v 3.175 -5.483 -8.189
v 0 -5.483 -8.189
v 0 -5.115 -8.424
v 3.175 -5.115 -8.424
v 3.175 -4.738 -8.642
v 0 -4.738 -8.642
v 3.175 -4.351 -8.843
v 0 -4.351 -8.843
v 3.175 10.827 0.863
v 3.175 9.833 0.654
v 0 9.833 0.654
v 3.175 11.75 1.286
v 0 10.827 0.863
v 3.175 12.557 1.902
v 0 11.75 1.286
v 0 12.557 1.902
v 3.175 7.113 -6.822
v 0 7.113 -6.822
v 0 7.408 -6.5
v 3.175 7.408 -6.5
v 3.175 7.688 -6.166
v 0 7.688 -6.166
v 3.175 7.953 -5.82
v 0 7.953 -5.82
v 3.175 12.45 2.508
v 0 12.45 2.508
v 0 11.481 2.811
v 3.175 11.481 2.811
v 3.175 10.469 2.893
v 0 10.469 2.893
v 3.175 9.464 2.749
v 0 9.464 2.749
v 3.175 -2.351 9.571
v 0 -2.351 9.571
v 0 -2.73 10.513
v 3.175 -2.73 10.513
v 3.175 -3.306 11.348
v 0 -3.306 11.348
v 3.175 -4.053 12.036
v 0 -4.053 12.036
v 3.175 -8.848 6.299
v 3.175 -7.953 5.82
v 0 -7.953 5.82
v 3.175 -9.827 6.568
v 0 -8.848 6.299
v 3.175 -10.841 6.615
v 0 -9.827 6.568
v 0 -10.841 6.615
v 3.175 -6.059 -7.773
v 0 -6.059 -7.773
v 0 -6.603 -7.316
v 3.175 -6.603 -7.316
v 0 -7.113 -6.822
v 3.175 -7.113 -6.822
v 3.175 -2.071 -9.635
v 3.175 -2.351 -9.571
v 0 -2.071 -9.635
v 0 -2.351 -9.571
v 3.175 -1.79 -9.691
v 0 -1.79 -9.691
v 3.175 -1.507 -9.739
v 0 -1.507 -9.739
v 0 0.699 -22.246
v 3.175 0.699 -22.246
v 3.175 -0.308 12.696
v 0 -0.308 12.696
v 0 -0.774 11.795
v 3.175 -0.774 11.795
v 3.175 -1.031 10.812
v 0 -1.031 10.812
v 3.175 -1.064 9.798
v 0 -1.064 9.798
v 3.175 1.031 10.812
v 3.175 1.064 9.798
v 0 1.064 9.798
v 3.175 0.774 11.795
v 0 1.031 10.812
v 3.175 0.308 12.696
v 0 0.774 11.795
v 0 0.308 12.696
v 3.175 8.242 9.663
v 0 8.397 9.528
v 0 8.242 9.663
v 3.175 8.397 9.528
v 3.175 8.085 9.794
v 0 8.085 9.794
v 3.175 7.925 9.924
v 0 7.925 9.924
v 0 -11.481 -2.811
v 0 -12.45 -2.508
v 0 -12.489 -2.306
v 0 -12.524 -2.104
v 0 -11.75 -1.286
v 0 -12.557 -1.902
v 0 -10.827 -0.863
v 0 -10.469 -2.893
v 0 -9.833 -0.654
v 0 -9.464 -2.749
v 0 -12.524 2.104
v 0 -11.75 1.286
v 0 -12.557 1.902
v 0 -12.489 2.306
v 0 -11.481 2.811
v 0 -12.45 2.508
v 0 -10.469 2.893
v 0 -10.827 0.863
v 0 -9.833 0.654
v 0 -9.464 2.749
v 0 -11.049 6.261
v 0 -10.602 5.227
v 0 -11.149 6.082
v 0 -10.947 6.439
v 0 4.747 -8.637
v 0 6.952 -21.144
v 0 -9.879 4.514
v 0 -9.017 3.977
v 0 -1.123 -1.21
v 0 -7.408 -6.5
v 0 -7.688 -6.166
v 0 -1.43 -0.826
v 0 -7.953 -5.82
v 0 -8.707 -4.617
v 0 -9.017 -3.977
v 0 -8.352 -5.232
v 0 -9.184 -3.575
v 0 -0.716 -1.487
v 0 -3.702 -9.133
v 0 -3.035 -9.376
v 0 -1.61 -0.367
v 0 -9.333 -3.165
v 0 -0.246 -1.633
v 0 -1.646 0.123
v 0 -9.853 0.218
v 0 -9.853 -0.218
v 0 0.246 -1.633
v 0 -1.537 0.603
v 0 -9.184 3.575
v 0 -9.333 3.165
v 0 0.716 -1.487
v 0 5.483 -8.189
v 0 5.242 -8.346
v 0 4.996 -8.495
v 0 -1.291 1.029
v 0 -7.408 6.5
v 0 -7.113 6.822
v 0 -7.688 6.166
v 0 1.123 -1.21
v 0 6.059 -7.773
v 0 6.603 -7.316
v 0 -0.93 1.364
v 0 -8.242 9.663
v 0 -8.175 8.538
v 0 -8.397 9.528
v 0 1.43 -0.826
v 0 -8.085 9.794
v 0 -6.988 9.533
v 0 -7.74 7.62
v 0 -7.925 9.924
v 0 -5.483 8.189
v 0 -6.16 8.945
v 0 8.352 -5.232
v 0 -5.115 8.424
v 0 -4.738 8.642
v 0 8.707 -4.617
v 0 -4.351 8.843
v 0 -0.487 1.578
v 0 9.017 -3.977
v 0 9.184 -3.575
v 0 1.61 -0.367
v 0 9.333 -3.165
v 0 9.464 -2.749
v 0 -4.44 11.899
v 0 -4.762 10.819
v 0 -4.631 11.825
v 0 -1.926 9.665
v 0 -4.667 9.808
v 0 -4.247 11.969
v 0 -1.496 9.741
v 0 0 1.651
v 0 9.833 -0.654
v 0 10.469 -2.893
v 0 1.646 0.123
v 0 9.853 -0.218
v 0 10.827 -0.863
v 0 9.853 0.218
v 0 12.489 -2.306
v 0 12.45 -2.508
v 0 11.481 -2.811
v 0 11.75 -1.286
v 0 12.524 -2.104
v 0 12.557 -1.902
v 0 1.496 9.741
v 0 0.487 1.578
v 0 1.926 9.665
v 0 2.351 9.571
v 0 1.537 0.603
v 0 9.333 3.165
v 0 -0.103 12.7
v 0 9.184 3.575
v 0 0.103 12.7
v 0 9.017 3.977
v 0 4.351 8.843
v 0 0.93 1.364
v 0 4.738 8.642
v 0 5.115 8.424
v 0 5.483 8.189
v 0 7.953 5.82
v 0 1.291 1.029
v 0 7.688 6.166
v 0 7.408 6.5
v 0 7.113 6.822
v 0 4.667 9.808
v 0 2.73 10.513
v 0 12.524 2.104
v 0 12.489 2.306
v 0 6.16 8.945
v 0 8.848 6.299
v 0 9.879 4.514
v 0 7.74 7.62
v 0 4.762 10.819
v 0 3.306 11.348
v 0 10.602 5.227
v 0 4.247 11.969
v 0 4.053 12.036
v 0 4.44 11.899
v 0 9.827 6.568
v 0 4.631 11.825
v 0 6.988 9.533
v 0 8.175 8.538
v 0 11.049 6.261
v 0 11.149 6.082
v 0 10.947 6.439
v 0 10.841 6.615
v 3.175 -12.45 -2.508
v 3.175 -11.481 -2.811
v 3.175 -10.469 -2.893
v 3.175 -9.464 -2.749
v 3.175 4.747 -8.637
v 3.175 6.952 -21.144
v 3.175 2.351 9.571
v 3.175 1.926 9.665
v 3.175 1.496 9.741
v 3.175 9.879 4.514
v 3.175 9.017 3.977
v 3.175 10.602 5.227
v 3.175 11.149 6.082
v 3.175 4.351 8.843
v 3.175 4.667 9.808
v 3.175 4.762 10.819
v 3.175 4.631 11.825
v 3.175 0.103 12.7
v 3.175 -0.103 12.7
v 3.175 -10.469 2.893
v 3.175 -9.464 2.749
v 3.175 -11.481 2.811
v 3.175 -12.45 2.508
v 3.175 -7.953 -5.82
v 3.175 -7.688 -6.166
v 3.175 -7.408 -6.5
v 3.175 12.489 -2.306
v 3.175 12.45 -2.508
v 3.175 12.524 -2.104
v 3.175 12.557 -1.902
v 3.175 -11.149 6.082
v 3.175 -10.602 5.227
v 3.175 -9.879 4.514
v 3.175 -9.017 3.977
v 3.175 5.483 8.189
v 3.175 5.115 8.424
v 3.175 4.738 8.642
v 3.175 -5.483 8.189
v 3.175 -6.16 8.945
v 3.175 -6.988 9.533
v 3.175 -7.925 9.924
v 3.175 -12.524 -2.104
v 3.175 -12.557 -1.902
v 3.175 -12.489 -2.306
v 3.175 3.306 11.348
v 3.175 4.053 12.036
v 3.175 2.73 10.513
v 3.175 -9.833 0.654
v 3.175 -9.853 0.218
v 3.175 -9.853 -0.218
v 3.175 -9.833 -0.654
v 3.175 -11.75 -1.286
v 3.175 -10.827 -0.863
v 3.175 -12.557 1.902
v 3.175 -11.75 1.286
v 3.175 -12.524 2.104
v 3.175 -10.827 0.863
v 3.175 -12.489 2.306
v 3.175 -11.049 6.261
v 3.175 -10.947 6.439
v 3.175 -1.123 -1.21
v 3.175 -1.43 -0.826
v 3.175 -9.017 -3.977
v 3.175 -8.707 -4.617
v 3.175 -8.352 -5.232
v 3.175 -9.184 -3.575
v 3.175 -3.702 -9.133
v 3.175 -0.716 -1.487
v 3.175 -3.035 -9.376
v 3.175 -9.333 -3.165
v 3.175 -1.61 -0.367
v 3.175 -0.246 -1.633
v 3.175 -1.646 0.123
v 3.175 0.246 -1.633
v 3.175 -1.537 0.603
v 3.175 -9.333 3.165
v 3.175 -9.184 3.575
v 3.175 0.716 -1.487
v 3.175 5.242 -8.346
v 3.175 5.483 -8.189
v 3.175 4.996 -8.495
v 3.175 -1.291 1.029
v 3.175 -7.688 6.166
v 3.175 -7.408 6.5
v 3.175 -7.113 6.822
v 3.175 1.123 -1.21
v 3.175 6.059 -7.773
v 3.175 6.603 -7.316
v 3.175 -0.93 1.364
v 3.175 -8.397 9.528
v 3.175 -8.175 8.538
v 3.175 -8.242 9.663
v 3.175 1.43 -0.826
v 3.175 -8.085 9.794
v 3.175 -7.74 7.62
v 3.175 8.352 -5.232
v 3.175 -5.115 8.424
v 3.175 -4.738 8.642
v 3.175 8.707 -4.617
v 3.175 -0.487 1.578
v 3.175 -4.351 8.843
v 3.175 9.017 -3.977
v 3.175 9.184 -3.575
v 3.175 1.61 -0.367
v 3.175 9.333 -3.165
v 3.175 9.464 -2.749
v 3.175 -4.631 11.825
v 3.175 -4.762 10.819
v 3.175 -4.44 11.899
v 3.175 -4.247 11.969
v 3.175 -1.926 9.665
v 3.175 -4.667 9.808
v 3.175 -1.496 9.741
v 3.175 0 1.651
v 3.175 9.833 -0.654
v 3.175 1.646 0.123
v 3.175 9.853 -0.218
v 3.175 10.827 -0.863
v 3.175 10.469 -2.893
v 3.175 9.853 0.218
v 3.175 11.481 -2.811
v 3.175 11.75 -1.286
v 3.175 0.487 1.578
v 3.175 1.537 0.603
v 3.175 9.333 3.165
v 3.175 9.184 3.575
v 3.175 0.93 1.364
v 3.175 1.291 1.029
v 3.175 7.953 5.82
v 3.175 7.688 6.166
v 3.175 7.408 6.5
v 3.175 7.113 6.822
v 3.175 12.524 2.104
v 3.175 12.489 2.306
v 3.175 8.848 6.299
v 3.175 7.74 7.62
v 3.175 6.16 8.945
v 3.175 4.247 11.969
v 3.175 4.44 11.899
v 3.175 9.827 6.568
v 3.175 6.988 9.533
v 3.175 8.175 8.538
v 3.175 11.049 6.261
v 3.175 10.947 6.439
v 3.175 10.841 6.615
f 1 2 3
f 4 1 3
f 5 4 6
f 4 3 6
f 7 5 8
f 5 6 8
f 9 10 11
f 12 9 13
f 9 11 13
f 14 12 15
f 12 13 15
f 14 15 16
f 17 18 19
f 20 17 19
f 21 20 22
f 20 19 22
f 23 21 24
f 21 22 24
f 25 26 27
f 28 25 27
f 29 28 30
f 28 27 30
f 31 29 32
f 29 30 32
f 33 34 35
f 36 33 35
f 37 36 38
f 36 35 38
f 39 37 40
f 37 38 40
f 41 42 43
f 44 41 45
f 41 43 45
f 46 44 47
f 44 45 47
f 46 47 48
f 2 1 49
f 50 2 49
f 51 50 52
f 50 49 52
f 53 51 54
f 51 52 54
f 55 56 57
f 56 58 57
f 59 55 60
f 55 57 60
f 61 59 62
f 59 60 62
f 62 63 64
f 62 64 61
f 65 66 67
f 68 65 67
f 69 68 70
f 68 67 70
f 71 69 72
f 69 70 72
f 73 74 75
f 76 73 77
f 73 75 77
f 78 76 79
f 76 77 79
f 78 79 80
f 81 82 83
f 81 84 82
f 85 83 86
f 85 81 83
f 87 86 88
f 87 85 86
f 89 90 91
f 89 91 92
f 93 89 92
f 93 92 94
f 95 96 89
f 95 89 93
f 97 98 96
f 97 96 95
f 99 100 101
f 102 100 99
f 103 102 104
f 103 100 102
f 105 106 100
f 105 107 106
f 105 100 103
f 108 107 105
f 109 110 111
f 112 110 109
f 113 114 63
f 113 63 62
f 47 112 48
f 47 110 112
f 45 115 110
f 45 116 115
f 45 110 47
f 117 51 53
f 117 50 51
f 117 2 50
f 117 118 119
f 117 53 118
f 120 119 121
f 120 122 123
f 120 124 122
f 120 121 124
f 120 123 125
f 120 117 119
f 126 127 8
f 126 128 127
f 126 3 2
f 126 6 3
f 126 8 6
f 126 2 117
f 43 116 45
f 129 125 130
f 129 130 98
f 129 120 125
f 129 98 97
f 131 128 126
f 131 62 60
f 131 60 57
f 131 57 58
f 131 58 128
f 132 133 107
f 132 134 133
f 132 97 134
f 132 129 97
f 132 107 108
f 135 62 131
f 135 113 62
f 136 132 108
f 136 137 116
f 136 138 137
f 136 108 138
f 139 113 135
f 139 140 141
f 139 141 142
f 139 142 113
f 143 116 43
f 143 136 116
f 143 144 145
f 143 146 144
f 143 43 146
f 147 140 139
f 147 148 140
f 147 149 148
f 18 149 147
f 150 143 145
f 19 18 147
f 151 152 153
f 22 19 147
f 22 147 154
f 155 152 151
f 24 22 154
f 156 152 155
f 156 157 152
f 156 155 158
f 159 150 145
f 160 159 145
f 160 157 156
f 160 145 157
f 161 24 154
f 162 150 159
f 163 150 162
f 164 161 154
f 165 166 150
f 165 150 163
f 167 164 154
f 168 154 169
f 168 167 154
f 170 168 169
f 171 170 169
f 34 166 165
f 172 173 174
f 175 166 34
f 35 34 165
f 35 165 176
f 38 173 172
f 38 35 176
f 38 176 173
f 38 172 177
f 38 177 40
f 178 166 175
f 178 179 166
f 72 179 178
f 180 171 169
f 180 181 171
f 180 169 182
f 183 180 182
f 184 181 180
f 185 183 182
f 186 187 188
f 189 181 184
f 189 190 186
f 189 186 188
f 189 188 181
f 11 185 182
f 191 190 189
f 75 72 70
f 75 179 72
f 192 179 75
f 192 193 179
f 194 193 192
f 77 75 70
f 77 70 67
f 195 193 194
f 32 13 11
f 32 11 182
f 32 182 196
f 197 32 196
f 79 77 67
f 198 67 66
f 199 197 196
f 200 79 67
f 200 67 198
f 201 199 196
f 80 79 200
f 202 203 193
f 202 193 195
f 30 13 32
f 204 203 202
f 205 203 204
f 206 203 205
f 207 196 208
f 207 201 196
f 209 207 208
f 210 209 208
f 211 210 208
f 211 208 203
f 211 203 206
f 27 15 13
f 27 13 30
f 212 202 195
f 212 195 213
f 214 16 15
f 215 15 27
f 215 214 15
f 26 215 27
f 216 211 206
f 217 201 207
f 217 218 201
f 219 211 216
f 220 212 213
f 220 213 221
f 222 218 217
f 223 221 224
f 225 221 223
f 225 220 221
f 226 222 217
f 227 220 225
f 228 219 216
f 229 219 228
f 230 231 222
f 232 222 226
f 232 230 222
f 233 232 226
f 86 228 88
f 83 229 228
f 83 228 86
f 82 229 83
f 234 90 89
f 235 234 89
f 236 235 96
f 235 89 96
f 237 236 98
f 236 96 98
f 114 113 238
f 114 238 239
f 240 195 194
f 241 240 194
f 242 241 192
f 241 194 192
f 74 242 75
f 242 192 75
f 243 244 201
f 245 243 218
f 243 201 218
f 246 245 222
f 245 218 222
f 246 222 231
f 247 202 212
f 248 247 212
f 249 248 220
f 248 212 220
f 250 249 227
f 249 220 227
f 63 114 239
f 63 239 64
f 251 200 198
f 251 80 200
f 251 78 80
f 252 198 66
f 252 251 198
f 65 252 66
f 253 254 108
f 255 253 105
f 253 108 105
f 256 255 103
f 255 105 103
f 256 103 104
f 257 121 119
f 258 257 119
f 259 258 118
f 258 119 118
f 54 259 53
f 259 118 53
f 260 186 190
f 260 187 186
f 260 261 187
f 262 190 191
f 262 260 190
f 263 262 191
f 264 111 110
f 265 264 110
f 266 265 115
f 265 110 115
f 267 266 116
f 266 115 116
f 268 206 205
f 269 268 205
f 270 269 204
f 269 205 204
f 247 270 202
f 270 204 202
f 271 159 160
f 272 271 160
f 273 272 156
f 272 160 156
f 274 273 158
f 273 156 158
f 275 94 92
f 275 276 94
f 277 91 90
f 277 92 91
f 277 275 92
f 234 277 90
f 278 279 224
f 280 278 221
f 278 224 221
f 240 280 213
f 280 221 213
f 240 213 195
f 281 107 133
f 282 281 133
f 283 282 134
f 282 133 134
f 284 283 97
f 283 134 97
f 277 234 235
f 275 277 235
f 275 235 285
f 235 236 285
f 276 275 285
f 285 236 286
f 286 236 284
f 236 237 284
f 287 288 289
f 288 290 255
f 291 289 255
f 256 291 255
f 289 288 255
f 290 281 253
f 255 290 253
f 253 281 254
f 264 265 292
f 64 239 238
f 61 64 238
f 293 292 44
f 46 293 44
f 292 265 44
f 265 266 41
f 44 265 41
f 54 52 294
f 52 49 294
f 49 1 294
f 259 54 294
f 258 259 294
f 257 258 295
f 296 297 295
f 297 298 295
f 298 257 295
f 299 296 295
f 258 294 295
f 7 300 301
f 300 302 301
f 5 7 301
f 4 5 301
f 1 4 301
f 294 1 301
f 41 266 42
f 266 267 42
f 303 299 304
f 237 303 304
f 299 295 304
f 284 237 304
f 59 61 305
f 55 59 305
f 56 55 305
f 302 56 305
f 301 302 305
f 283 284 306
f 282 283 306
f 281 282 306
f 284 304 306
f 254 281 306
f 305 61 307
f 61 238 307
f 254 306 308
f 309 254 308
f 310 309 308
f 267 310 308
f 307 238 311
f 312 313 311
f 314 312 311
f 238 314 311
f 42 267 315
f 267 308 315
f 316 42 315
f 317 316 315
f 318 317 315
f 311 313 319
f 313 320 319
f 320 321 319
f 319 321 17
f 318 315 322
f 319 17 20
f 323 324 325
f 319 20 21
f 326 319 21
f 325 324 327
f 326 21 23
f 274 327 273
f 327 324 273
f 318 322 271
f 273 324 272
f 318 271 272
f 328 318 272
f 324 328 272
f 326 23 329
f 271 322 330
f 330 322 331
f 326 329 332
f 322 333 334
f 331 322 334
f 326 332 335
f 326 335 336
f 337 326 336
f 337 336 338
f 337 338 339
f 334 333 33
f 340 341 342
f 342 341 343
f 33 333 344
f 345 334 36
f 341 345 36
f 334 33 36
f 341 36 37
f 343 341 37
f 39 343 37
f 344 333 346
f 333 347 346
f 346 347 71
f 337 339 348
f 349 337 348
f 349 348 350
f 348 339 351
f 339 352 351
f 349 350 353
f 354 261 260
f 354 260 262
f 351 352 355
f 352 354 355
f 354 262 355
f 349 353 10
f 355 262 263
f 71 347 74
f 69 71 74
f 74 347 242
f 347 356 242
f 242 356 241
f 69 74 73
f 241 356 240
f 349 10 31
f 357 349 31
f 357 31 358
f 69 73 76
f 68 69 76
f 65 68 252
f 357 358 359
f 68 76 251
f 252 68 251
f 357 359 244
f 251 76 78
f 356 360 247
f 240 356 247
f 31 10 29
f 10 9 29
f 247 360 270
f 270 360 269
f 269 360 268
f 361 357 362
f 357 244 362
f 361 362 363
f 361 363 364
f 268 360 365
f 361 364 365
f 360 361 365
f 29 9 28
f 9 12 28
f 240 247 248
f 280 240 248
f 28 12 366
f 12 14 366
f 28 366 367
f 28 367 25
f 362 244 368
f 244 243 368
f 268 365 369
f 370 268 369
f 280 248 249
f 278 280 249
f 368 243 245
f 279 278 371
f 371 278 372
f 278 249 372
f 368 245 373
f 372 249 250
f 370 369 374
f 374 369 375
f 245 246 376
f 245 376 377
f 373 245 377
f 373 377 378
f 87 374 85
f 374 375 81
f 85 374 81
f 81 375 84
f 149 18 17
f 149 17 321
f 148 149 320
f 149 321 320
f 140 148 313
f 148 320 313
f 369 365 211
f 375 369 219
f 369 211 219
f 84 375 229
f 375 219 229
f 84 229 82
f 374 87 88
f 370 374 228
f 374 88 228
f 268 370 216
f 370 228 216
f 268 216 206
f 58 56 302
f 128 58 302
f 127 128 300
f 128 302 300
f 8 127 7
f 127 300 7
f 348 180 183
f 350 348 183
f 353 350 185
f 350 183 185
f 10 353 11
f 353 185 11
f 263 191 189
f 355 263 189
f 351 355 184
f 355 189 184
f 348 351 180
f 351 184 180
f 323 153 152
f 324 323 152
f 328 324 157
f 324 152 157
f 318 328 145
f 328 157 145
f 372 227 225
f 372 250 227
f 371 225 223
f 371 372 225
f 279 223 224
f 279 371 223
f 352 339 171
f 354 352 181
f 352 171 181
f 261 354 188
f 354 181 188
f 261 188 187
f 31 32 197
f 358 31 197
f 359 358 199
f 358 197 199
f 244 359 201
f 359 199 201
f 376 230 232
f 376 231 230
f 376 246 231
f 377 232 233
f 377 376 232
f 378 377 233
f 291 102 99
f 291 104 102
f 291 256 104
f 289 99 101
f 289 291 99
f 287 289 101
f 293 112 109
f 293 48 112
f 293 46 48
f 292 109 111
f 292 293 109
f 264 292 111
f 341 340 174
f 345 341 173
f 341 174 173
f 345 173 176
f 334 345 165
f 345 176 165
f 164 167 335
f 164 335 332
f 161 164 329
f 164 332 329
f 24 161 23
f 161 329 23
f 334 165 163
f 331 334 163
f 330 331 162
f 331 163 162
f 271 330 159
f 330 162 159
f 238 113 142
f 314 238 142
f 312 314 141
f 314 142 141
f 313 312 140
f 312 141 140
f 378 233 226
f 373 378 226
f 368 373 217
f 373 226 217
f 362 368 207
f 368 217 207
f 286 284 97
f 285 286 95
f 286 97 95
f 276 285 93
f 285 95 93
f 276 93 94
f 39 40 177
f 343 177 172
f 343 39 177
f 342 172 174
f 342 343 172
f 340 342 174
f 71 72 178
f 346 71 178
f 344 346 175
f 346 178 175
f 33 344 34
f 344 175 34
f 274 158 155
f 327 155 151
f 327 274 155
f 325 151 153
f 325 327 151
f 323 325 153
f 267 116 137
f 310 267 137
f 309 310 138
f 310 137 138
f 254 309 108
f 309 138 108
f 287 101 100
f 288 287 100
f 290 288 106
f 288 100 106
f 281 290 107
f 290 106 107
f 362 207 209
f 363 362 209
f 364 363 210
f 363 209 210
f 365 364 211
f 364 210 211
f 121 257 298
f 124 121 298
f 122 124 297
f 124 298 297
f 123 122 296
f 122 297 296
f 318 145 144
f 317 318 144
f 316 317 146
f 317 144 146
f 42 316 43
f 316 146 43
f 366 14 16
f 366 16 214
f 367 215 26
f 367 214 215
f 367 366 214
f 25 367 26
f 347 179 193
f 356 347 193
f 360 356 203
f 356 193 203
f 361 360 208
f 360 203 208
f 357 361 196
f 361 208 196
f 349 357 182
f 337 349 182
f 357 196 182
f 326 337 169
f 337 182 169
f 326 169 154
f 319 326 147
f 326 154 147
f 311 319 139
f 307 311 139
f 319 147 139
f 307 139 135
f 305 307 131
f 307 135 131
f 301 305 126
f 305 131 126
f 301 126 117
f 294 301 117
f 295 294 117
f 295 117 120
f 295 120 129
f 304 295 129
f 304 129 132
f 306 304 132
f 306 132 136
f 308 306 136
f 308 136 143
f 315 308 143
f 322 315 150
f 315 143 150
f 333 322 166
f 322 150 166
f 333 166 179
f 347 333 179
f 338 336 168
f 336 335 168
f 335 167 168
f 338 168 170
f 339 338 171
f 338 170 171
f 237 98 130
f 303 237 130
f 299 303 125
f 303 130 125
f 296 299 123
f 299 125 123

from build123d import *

# Parameters (mm, degrees)
BASPROSKE_W                  = 3.175
BASPROSKE_H                  = 12.7
TOOTHCUT_DEPTH               = 19.238986403
TEETHCUTS_COUNT              = 18
TEETHCUTS_ANGLE              = 340
BORSKE_R                     = 1.5875
BORE_DEPTH                   = 50.8000508
CUT_EXTRUDE_THIN1_DEPTH      = 2.54
CUT_EXTRUDE_THIN1_DEPTH_BACK = 5.08
BOSS_EXTRUDE1_DEPTH          = 3.175
SKETCH9_R                    = 1.651
CUT_EXTRUDE2_DEPTH           = 3.175


with BuildPart() as part:
    # BasProSke → Base-Revolve (revolve)
    with BuildSketch(Plane(origin=(0, 0, 0), x_dir=(1, 0, 0), z_dir=(0, 1, 0)), mode=Mode.PRIVATE) as base_revolve_sk:
        with Locations((1.5875, 6.35)):
            Rectangle(BASPROSKE_W, BASPROSKE_H)
    revolve(base_revolve_sk.sketch.rotate(Axis((-10, 0, 0), (1, 0, 0)), 180), axis=Axis((-10, 0, 0), (1, 0, 0)))

    # TooCutSke → ToothCut (cut, through all)
    with BuildSketch(Plane(origin=(0, 0, 0), x_dir=(0, 0, -1), z_dir=(1, 0, 0))):
        with BuildLine():
            ThreePointArc((0.653663469, 9.833498417), (0, 9.8552), (-0.653663469, 9.833498417))
            ThreePointArc((-0.653663469, 9.833498417), (-1.05484238, 11.314407704), (-1.923354389, 12.579209556))
            ThreePointArc((-1.923354389, 12.579209556), (0, 12.7254), (1.923354389, 12.579209556))
            ThreePointArc((1.923354389, 12.579209556), (1.05484238, 11.314407704), (0.653663469, 9.833498417))
        make_face()
    toothcut = extrude(amount=TOOTHCUT_DEPTH, mode=Mode.SUBTRACT)

    # TeethCuts: ToothCut ×18 about axis
    teethcuts_axis = Axis((-10, 0, 0), (1, 0, 0))
    for i in range(1, TEETHCUTS_COUNT):
        add(toothcut.rotate(teethcuts_axis, i * TEETHCUTS_ANGLE / (TEETHCUTS_COUNT - 1)), mode=Mode.SUBTRACT)

    # BorSke → Bore (cut, symmetric)
    with BuildSketch(Plane(origin=(0, 0, 0), x_dir=(0, 0, -1), z_dir=(1, 0, 0))):
        with Locations(Location((0, 0, 0), (0, 0, 180))):
            Circle(BORSKE_R)
    extrude(amount=BORE_DEPTH, both=True, mode=Mode.SUBTRACT)

    # Sketch7 → Cut-Extrude-Thin1 (cut, two sides: drawn at the far end of the back side and taken through both)
    with BuildSketch(Plane.ZY.offset(-CUT_EXTRUDE_THIN1_DEPTH_BACK)):
        with BuildLine():
            Line((-10.823936545, 10.290898732), (-25.264431922, 12.837147681))
            Line((-25.264431922, 12.837147681), (-28.131363335, -3.422028321))
            Line((-28.131363335, -3.422028321), (-13.690867959, -5.968277271))
            ThreePointArc((-13.690867959, -5.968277271), (-11.782416361, -9.177955314), (-9.137407483, -11.813889433))
            Line((-9.137407483, -11.813889433), (-10.123749891, -15.359323522))
            ThreePointArc((-10.123749891, -15.359323522), (18.392184669, -0.355912967), (-9.521946872, 15.739493597))
            Line((-9.521946872, 15.739493597), (-8.708557038, 12.133475733))
            ThreePointArc((-8.708557038, 12.133475733), (-9.809604931, 11.261964755), (-10.823936545, 10.290898732))
        make_face()
        with BuildLine():
            Line((-8.636682816, 4.746859697), (-21.143741279, 6.952191553))
            Line((-21.143741279, 6.952191553), (-22.246407207, 0.698662322))
            Line((-22.246407207, 0.698662322), (-9.739348744, -1.506669535))
            ThreePointArc((-9.739348744, -1.506669535), (-7.549024322, -6.335392555), (-3.17353646, -9.330253661))
            Line((-3.17353646, -9.330253661), (-4.102105036, -12.668018169))
            ThreePointArc((-4.102105036, -12.668018169), (13.313553301, -0.235050135), (-3.652381497, 12.804923251))
            Line((-3.652381497, 12.804923251), (-2.889344669, 9.422136405))
            ThreePointArc((-2.889344669, 9.422136405), (-6.219073923, 7.64513483), (-8.636682816, 4.746859697))
        make_face(mode=Mode.SUBTRACT)
    extrude(amount=CUT_EXTRUDE_THIN1_DEPTH + CUT_EXTRUDE_THIN1_DEPTH_BACK, mode=Mode.SUBTRACT)

    # Sketch8 → Boss-Extrude1 (add)
    with BuildSketch(Plane.ZY):
        Polygon((-21.143741279, 6.952191553), (-22.246407207, 0.698662322), (-9.739348744, -1.506669535), (-8.636682816, 4.746859697), align=None)
    extrude(amount=-BOSS_EXTRUDE1_DEPTH)

    # Sketch9 → Cut-Extrude2 (cut)
    with BuildSketch(Plane.ZY):
        Circle(SKETCH9_R)
    extrude(amount=-CUT_EXTRUDE2_DEPTH, mode=Mode.SUBTRACT)


solid = part.part
